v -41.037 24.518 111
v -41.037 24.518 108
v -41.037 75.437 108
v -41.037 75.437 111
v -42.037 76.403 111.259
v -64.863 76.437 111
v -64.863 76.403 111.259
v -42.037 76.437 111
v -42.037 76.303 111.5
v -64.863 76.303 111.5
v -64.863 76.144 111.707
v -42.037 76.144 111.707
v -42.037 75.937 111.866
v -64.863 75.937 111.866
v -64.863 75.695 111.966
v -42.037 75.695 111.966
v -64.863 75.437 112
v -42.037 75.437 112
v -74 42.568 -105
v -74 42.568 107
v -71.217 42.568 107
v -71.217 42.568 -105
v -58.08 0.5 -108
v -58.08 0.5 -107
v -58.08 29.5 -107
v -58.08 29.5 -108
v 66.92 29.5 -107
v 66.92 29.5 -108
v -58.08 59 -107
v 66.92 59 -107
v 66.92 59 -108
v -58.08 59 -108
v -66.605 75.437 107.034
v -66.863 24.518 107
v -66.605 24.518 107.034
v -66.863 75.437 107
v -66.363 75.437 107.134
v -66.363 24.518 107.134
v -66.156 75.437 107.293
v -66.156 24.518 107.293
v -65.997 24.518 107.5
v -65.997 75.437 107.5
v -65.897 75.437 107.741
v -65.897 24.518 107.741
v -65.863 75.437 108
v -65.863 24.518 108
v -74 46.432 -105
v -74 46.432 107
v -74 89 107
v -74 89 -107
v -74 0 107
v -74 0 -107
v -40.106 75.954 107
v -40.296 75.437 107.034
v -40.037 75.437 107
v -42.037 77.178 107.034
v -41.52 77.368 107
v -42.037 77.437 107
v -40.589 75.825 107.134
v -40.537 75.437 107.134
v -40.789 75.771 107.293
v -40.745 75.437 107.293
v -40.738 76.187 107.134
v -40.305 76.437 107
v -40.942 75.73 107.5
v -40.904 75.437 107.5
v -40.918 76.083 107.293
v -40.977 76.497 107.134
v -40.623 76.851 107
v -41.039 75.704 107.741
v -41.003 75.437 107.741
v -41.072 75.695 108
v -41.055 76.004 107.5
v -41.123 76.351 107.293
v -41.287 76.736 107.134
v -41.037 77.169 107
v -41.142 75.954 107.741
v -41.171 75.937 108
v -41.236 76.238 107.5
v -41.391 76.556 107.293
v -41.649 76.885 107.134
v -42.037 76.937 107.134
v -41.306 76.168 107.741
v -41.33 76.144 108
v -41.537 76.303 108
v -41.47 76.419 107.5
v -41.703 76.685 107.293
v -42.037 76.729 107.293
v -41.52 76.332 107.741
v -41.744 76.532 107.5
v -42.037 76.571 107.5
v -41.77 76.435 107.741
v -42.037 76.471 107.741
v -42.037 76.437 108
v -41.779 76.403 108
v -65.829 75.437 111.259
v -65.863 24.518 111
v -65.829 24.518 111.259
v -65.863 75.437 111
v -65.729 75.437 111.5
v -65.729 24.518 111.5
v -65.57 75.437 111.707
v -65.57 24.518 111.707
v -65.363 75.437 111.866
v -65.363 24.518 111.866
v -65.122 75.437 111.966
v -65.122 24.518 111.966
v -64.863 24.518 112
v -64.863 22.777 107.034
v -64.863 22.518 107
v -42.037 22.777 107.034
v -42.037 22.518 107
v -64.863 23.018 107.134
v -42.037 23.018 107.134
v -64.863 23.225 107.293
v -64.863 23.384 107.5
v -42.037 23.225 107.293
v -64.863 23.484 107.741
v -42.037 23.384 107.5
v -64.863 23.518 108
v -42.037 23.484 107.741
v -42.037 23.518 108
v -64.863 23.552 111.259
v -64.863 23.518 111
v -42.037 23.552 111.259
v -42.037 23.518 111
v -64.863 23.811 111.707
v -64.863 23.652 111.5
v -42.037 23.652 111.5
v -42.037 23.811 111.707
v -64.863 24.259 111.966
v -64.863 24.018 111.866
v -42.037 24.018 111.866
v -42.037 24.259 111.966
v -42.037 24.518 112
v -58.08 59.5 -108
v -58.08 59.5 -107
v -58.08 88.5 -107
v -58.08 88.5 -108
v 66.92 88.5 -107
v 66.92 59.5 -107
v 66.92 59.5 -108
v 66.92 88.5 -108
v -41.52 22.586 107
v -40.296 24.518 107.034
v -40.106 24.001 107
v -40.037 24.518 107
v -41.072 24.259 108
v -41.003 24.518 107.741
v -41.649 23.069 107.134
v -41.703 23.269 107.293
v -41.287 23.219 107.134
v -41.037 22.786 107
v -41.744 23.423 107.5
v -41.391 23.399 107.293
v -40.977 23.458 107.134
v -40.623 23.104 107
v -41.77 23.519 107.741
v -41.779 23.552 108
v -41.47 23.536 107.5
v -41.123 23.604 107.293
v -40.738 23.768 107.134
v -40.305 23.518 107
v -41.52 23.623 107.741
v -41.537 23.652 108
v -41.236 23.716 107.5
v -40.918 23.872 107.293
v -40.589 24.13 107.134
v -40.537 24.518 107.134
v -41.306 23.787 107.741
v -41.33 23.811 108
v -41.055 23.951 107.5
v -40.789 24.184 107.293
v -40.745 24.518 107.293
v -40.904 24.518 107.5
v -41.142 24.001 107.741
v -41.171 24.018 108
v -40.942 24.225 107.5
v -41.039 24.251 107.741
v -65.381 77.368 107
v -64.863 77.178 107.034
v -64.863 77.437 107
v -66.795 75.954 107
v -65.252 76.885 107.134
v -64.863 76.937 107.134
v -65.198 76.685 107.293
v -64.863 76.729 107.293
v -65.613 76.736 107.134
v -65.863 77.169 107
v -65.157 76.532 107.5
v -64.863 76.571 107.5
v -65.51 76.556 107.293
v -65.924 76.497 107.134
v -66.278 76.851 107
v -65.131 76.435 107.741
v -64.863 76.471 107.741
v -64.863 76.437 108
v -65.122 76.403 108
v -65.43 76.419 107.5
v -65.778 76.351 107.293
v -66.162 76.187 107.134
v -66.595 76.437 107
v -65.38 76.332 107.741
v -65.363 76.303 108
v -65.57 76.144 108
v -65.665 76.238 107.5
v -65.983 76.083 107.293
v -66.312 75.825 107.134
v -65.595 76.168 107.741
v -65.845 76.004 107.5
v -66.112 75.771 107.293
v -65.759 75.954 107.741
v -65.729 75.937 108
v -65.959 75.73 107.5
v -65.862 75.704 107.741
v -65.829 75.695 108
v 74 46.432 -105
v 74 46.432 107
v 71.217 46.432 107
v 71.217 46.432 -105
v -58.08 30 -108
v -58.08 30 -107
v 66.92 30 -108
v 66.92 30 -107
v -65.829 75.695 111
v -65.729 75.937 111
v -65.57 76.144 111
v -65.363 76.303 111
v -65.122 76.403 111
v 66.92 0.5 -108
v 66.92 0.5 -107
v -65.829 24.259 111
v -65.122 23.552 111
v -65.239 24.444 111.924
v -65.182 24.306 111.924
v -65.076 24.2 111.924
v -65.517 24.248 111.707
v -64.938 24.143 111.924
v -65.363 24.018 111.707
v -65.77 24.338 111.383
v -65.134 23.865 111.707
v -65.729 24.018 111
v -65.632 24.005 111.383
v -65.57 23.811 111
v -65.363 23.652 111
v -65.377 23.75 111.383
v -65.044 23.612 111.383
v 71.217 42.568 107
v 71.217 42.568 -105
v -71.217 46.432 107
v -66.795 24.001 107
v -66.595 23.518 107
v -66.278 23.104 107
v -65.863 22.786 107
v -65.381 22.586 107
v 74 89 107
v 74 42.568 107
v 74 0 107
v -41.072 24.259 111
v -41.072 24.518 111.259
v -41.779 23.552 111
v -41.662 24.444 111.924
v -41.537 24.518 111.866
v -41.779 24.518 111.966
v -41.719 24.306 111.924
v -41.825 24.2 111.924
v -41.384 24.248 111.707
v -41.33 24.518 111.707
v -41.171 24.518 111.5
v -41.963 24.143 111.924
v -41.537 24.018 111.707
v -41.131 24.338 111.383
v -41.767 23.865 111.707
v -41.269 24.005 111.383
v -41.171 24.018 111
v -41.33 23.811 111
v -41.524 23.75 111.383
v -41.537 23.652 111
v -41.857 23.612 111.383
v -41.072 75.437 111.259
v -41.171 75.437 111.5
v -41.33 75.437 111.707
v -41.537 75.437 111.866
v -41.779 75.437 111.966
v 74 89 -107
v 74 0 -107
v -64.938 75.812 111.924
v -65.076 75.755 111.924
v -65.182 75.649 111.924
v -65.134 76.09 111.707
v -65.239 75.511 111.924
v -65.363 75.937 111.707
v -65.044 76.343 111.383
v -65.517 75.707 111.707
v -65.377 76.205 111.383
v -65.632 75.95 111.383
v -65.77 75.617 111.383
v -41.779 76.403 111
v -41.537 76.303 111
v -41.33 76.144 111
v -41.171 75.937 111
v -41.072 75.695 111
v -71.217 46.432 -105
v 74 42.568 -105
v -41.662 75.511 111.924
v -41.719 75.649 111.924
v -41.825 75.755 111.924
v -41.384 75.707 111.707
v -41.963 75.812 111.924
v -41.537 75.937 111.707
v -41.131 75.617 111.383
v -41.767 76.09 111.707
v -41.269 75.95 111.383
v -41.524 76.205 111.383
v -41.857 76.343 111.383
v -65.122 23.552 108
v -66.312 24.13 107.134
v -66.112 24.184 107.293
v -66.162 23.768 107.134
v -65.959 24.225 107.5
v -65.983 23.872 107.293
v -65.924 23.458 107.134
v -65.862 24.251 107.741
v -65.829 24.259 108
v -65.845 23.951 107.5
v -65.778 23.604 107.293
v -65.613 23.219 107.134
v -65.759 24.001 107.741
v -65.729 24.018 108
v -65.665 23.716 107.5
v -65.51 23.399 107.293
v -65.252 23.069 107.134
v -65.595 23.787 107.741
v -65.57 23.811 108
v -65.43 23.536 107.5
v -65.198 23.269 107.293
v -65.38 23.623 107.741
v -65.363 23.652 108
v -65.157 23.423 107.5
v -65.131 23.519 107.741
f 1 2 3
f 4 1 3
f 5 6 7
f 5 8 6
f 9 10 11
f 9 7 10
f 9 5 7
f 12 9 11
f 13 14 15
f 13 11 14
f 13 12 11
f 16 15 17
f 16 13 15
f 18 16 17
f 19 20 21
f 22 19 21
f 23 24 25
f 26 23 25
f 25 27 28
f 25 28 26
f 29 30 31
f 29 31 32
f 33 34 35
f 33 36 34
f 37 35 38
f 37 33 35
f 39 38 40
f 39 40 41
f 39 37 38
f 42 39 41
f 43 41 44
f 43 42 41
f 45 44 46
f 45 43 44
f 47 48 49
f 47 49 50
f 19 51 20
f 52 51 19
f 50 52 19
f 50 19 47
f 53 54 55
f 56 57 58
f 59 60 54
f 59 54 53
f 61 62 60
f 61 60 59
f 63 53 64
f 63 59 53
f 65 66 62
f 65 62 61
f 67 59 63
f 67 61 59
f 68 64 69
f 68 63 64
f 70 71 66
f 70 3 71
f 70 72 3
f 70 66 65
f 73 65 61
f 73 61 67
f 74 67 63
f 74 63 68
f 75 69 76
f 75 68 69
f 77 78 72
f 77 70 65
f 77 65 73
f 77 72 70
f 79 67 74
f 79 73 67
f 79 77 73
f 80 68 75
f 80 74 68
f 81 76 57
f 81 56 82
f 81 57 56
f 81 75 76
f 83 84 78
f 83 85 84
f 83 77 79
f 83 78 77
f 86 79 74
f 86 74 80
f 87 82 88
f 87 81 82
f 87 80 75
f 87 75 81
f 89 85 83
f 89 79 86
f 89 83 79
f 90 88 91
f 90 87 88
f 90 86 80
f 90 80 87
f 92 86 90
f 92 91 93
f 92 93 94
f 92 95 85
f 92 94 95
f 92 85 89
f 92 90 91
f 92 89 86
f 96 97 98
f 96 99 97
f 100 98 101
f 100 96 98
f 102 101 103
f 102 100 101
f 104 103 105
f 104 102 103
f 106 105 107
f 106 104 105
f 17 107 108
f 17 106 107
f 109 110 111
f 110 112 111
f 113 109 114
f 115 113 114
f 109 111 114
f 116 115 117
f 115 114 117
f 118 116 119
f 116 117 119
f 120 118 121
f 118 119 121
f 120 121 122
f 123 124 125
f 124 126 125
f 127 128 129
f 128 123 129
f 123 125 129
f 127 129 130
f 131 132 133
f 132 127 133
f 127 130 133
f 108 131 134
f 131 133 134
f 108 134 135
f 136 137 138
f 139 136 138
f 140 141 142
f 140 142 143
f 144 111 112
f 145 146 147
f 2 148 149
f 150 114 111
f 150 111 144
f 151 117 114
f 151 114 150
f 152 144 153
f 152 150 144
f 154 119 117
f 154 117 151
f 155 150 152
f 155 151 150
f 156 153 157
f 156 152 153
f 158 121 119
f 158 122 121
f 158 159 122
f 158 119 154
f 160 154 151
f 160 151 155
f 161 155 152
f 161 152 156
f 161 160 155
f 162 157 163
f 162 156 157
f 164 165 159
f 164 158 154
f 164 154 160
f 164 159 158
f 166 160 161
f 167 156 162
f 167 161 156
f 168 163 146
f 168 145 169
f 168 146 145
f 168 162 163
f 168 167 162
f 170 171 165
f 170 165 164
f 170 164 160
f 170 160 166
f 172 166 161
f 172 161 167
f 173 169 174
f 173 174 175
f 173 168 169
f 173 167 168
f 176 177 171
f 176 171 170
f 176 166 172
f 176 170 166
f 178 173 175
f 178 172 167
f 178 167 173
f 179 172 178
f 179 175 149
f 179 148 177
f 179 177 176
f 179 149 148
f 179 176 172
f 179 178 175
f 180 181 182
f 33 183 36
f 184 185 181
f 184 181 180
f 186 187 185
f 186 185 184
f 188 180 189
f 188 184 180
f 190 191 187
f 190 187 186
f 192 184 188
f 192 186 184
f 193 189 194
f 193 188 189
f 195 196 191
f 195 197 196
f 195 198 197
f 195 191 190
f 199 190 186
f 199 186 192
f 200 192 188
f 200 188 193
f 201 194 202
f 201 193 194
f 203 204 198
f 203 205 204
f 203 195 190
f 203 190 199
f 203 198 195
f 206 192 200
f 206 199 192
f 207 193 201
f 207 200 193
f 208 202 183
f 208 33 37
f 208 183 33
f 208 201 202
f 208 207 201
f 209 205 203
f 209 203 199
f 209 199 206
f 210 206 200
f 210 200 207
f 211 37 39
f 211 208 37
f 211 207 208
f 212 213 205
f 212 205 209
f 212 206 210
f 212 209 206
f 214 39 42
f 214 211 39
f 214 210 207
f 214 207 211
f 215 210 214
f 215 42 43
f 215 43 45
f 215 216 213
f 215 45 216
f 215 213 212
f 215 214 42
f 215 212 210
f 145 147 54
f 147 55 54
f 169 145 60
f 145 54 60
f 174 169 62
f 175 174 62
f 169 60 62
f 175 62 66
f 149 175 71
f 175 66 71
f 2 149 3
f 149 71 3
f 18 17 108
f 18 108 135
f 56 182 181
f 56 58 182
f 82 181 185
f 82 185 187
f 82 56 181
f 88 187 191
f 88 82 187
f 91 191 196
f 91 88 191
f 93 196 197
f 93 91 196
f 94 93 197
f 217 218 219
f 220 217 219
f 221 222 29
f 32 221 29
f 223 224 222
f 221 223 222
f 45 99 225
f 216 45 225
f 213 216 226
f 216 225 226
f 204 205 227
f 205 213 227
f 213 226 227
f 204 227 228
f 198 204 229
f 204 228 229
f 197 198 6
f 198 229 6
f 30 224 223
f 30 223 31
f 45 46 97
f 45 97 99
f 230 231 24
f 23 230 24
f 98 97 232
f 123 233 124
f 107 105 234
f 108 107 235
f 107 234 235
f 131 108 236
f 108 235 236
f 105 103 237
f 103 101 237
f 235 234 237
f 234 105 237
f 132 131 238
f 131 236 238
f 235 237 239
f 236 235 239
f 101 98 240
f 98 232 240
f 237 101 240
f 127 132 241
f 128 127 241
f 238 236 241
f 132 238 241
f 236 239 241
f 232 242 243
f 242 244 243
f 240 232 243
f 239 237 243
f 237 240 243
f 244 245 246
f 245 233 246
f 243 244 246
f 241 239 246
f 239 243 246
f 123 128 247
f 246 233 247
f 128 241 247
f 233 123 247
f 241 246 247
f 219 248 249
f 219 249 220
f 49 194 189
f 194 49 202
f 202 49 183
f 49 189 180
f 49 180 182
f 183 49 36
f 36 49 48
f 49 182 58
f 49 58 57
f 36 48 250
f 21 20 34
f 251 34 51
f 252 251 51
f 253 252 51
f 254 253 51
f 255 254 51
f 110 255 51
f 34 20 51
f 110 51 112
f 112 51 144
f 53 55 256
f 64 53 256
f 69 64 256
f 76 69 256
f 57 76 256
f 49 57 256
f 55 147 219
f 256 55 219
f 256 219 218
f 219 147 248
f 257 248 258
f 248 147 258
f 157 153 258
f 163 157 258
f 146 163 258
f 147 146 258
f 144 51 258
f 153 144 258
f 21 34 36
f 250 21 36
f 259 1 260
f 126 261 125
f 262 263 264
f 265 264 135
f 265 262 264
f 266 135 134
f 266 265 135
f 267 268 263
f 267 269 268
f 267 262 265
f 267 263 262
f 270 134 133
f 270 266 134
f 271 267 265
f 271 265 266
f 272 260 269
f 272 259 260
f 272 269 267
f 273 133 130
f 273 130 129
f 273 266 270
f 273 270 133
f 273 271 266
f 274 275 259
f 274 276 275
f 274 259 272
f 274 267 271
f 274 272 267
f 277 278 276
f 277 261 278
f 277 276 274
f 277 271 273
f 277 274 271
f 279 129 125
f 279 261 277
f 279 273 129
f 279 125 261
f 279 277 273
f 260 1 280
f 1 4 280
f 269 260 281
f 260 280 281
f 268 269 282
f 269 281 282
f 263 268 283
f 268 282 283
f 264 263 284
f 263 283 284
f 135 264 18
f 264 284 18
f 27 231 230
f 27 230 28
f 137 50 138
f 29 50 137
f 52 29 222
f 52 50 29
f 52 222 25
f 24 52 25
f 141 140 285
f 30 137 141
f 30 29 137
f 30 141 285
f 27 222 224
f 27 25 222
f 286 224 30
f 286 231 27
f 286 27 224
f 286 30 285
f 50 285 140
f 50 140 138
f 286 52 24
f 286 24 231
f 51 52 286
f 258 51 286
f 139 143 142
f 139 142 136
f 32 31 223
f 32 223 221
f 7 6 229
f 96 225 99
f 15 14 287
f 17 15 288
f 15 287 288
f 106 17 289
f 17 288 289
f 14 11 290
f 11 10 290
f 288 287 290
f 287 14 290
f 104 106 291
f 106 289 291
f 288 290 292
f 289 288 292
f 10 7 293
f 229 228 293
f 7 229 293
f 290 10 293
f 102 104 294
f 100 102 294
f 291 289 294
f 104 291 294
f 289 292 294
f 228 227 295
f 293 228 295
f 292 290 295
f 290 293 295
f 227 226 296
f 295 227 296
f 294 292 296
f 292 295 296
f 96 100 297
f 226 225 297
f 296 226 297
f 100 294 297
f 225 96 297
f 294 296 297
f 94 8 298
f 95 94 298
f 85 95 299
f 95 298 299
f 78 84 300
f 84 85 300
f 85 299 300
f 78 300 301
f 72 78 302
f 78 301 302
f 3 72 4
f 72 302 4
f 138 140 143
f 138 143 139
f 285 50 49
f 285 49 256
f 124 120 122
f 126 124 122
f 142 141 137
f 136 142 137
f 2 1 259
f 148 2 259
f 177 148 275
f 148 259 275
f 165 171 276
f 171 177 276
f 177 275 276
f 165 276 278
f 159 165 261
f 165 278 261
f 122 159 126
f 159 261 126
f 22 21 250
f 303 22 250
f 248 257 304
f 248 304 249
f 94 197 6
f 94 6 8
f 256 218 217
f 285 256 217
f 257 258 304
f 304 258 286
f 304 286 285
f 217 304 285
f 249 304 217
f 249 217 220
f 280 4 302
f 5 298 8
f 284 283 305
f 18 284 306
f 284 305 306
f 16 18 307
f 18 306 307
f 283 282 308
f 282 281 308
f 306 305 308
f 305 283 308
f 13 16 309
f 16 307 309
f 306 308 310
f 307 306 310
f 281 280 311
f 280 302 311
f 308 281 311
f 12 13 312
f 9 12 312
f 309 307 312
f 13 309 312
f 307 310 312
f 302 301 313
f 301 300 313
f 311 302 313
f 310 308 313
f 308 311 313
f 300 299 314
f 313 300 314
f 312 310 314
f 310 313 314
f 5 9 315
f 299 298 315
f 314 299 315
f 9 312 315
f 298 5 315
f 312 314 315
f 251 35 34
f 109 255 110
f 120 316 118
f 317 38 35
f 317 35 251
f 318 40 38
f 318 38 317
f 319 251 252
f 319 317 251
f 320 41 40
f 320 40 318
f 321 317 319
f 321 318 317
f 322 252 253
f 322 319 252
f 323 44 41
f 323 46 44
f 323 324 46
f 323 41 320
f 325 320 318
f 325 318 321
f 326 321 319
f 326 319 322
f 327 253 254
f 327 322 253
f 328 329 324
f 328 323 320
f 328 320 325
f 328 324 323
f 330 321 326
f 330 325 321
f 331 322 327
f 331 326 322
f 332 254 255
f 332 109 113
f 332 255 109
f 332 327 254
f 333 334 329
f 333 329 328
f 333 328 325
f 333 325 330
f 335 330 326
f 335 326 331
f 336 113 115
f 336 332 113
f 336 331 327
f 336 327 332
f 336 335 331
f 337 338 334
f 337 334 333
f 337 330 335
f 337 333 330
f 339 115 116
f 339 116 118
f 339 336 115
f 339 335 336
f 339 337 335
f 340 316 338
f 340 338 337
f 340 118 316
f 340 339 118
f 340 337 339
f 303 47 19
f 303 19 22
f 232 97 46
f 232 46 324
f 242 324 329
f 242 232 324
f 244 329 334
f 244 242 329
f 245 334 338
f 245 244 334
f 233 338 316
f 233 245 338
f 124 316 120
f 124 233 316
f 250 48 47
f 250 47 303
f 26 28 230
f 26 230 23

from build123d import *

# Parameters (mm, degrees)
SKETCH1_W           = 148
SKETCH1_H           = 214
BOSS_EXTRUDE1_DEPTH = 89
SKETCH2_W           = 5.566237362
SKETCH2_H           = 3.86389192
CUT_EXTRUDE1_DEPTH  = 212
SKETCH3_W           = 24.825910207
SKETCH3_H           = 52.918387546
BOSS_EXTRUDE2_DEPTH = 5
FILLET1_R           = 1
SKETCH4_W           = 125
SKETCH4_H           = 29
BOSS_EXTRUDE3_DEPTH = 1
LPATTERN1_COUNT     = 3
LPATTERN1_PITCH     = 29.5


with BuildPart() as part:
    # Sketch1 → Boss-Extrude1 (new body)
    with BuildSketch(Plane(origin=(0, 0, 0), x_dir=(1, 0, 0), z_dir=(0, 1, 0))):
        Rectangle(SKETCH1_W, SKETCH1_H)
    extrude(amount=BOSS_EXTRUDE1_DEPTH)

    # Sketch2 → Cut-Extrude1 (cut)
    with BuildSketch(Plane.XY.offset(107)):
        with Locations((-74, 44.5)):
            Rectangle(SKETCH2_W, SKETCH2_H)
    cut_extrude1 = extrude(amount=-CUT_EXTRUDE1_DEPTH, mode=Mode.SUBTRACT)

    # Mirror1: Cut-Extrude1 across plane
    add(cut_extrude1.mirror(Plane(origin=(0, 0, 0), x_dir=(0, 0, 1), z_dir=(1, 0, 0))), mode=Mode.SUBTRACT)

    # Sketch3 → Boss-Extrude2 (add)
    with BuildSketch(Plane.XY.offset(107)):
        with Locations((-53.45043607, 49.977386193)):
            Rectangle(SKETCH3_W, SKETCH3_H)
    extrude(amount=BOSS_EXTRUDE2_DEPTH)

    # Fillet1
    fillet1_edges = [part.edges().sort_by_distance(p)[0] for p in [
        (-41.037480966, 49.977386193, 107),
        (-41.037480966, 23.51819242, 109.5),
        (-53.450436069, 76.436579966, 107),
        (-41.037480966, 76.436579966, 109.5),
        (-65.863391173, 49.977386193, 107),
        (-65.863391173, 76.436579966, 109.5),
        (-53.450436069, 23.51819242, 107),
        (-65.863391173, 23.51819242, 109.5),
        (-41.037480966, 49.977386193, 112),
        (-53.450436069, 76.436579966, 112),
        (-65.863391173, 49.977386193, 112),
        (-53.450436069, 23.51819242, 112),
    ]]
    fillet(fillet1_edges, radius=FILLET1_R)

    # Sketch4 → Boss-Extrude3 (add)
    with BuildSketch(Plane(origin=(0, 0, -107), x_dir=(-1, 0, 0), z_dir=(0, 0, -1))):
        with Locations((-4.420464609, 74)):
            Rectangle(SKETCH4_W, SKETCH4_H)
    boss_extrude3 = extrude(amount=BOSS_EXTRUDE3_DEPTH)

    # LPattern1: Boss-Extrude3 ×3
    with Locations(*[(0, -i * LPATTERN1_PITCH, 0) for i in range(1, LPATTERN1_COUNT)]):
        add(boss_extrude3)


solid = part.part
